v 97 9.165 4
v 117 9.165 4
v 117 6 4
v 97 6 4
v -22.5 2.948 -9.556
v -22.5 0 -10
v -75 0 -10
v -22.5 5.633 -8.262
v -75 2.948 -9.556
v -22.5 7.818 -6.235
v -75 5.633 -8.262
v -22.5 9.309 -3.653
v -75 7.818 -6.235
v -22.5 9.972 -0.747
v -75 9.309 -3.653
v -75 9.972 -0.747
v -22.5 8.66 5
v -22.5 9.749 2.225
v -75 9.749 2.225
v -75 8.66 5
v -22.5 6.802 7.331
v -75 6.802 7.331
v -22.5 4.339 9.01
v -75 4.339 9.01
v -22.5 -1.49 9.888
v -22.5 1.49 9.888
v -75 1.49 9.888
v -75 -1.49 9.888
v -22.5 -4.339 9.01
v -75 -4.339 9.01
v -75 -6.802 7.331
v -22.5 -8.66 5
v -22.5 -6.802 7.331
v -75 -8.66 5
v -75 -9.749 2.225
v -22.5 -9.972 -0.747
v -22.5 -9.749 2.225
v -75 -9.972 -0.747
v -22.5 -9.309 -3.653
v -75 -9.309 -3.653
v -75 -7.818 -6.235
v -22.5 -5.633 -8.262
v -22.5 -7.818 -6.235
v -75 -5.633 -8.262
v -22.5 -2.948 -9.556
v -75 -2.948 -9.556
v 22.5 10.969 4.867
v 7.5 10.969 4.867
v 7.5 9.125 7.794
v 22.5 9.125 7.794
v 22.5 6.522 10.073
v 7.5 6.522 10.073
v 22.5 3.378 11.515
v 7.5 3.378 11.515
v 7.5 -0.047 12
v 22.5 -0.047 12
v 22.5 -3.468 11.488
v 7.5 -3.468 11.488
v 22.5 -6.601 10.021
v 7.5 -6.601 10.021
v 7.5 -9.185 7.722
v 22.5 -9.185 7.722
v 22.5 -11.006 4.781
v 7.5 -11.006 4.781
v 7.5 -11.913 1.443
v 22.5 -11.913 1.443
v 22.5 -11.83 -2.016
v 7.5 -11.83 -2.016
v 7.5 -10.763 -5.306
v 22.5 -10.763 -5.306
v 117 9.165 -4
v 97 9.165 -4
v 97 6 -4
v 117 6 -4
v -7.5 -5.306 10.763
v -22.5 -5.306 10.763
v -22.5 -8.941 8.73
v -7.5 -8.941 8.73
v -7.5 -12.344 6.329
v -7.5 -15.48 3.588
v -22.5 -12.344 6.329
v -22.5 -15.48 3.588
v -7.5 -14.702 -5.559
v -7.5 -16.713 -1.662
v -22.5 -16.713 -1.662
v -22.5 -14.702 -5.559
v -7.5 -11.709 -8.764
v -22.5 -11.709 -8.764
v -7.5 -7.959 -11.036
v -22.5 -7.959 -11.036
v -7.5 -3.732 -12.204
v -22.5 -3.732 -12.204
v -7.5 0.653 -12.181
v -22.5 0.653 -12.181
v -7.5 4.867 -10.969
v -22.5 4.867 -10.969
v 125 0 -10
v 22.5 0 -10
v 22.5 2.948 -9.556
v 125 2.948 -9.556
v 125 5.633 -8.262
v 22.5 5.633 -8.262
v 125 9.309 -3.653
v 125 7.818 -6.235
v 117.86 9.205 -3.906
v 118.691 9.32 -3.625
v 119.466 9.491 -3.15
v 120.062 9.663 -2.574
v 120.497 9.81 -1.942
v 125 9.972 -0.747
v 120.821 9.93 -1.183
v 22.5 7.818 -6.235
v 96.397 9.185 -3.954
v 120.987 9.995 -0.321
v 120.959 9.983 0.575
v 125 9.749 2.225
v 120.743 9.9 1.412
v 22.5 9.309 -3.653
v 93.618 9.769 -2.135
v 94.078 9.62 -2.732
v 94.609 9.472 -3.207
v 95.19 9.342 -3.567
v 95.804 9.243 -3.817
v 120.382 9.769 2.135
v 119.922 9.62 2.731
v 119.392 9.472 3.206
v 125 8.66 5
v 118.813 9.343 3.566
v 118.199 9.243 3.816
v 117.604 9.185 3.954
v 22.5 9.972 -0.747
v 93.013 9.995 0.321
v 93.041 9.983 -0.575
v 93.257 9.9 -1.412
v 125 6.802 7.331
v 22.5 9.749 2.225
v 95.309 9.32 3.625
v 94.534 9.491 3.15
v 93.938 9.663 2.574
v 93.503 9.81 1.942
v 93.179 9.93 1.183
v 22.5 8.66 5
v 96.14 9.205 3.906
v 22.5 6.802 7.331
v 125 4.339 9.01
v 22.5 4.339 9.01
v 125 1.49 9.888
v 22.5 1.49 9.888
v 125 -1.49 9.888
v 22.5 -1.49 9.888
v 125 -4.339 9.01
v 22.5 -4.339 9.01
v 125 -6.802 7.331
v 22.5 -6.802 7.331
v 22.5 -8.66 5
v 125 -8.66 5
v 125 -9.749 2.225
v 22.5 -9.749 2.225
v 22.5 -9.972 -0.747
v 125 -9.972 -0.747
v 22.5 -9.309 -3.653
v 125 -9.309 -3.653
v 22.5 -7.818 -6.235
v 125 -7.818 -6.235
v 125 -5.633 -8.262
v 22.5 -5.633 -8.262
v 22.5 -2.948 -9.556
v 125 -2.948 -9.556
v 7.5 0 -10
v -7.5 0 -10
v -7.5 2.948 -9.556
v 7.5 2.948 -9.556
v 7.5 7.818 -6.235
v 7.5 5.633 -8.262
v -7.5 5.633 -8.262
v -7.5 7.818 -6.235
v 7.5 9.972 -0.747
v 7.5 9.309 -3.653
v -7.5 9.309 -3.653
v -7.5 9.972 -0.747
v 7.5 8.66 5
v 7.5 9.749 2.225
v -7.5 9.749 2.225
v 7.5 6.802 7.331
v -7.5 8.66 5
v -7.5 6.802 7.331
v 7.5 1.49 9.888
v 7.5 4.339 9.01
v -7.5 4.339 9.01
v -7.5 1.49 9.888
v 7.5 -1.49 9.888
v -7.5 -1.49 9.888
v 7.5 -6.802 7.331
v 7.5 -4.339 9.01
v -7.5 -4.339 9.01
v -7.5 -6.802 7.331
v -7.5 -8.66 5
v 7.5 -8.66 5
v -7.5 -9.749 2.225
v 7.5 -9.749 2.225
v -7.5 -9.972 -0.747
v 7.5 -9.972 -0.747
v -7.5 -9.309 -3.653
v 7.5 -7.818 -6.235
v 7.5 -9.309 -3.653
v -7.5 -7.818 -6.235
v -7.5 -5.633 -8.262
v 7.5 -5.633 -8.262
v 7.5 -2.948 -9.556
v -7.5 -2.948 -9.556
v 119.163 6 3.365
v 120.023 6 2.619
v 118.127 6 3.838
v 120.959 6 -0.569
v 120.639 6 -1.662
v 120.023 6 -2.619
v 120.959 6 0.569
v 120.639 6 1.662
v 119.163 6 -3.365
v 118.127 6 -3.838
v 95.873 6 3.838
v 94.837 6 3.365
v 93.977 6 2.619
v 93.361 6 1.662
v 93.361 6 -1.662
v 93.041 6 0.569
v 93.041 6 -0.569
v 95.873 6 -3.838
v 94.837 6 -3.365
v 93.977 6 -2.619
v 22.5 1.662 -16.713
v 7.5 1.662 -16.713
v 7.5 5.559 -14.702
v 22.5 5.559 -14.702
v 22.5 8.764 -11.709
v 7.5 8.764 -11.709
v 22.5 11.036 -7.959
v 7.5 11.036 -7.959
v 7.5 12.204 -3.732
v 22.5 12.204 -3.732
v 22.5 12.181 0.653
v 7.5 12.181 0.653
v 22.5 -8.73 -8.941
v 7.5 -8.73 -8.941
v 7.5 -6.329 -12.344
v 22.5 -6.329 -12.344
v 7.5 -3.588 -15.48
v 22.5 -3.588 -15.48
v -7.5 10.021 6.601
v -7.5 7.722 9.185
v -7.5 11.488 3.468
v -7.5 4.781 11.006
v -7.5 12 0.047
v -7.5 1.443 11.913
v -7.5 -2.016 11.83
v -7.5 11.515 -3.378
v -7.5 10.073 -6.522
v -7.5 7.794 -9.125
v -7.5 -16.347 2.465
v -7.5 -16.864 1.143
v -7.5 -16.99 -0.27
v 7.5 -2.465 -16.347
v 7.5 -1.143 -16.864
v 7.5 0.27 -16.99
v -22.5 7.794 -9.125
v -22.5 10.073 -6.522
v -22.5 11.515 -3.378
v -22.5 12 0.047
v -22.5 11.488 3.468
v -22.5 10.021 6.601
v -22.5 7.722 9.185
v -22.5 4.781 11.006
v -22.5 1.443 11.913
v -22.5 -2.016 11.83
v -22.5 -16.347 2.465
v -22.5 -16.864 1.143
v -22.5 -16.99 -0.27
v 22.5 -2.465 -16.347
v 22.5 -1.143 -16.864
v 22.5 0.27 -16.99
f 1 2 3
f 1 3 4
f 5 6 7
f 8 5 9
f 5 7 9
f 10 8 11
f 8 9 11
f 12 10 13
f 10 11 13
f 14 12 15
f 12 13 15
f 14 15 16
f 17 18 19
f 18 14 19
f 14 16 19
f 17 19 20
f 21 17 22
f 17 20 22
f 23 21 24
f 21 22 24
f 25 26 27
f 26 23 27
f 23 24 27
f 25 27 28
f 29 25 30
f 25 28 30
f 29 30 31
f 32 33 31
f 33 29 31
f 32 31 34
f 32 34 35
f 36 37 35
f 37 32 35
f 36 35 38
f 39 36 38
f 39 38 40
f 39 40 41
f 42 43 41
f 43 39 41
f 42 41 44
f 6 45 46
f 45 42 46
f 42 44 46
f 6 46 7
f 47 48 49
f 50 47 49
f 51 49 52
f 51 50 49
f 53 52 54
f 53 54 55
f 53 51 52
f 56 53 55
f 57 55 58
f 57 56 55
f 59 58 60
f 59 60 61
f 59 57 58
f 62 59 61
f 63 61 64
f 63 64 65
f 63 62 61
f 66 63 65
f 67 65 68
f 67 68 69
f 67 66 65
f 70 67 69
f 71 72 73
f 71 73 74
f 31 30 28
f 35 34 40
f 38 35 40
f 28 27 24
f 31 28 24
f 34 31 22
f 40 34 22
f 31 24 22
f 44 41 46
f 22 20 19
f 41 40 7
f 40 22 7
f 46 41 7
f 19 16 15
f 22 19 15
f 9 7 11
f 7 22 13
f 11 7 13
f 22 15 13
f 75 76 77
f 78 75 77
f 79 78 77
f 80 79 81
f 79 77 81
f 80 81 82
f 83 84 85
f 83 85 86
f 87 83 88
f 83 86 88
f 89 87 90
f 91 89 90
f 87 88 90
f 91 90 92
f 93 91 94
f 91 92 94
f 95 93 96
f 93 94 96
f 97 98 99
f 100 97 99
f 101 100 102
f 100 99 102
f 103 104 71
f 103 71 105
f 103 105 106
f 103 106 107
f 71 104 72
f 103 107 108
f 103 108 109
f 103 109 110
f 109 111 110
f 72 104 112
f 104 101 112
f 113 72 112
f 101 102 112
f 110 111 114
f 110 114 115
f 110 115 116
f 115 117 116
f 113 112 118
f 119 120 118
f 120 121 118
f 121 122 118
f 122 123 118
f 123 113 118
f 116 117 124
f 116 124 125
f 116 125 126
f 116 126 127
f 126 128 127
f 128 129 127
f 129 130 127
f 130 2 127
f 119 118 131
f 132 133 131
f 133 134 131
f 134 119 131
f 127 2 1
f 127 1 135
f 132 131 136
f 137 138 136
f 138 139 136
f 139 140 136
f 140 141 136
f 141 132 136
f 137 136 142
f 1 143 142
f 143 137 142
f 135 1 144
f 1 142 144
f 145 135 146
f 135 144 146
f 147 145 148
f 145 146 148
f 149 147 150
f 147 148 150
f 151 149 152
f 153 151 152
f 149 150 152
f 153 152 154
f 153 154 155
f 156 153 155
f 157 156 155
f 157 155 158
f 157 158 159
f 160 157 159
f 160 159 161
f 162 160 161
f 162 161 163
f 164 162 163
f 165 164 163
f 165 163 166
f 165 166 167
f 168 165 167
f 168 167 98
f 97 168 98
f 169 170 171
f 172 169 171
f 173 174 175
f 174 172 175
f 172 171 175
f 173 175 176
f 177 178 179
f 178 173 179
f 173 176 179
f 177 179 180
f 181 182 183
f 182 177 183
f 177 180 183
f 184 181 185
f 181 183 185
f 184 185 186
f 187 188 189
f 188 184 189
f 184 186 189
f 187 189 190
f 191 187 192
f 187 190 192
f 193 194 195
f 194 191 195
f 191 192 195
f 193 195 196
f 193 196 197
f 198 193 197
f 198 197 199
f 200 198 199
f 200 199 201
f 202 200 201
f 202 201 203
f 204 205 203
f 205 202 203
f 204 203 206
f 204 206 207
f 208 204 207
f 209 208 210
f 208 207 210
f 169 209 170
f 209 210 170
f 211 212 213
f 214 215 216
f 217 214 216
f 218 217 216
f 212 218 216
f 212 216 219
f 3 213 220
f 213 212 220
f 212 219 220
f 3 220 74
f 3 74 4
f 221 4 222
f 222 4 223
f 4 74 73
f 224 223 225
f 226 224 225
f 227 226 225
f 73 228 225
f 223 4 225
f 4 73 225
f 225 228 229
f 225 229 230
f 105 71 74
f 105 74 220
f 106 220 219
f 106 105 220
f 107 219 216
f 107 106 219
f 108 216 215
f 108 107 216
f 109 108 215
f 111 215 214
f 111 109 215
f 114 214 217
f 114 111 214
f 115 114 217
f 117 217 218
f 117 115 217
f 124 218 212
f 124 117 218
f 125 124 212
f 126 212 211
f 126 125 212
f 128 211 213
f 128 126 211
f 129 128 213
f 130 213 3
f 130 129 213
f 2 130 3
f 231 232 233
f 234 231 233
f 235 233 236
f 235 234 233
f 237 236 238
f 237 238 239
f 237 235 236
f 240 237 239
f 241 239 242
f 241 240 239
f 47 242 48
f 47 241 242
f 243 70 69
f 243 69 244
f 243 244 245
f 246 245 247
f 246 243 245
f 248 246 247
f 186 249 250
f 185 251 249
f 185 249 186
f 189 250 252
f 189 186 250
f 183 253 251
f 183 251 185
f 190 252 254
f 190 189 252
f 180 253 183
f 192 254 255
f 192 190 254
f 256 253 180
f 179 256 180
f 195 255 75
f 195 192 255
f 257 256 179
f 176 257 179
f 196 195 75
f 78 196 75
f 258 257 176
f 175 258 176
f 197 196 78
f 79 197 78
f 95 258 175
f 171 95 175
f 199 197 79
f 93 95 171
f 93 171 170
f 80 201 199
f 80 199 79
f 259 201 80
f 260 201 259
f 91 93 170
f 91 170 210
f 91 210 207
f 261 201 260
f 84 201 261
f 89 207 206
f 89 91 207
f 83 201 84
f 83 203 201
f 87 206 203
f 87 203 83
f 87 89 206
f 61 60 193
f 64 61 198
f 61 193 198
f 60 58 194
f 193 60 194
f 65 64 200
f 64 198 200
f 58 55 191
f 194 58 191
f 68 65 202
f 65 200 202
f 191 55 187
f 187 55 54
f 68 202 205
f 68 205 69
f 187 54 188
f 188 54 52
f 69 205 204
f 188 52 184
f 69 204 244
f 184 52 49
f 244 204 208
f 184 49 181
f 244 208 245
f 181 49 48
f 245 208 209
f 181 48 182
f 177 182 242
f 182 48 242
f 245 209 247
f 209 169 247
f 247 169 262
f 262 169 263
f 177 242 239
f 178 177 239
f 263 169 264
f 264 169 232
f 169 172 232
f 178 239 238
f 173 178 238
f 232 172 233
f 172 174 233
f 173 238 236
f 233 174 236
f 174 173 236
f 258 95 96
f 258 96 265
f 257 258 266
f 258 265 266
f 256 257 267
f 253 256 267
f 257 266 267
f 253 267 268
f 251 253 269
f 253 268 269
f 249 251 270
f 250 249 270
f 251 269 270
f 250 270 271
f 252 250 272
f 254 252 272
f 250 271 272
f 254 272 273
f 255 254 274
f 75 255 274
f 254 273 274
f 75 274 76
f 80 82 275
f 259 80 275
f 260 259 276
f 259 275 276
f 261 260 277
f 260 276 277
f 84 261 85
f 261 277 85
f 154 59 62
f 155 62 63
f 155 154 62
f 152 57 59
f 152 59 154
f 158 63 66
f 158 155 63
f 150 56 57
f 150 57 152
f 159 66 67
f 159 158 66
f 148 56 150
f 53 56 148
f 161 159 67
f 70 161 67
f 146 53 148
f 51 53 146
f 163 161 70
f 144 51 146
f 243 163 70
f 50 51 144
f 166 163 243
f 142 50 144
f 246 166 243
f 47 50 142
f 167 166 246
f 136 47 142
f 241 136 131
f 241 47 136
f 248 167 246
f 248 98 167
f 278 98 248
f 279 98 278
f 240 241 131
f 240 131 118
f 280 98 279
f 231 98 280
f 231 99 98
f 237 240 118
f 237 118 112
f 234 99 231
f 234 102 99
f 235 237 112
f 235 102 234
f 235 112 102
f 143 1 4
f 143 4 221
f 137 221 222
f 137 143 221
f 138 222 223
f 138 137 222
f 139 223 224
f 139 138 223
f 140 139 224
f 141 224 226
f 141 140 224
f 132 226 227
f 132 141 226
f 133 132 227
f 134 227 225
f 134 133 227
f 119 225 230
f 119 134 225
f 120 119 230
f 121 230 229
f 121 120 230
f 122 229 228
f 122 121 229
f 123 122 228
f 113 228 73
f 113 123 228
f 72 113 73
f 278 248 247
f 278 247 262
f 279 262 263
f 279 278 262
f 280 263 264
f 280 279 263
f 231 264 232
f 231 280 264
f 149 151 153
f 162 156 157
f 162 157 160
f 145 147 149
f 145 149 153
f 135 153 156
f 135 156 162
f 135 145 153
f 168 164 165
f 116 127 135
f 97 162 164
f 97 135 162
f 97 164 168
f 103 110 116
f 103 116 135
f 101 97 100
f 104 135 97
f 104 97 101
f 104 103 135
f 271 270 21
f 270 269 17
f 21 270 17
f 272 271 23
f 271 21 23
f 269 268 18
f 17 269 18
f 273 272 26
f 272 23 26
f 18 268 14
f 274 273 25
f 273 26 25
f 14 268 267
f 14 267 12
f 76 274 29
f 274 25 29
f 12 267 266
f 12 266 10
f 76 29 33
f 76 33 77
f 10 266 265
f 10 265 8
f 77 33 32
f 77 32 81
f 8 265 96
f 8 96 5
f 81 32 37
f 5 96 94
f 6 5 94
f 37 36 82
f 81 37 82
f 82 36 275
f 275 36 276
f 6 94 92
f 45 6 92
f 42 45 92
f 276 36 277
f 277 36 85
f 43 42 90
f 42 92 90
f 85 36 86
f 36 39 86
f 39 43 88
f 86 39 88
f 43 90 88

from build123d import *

# Parameters (mm, degrees)
BOSS_EXTRUDE1_DEPTH      = 125
BOSS_EXTRUDE1_DEPTH_BACK = 75
SKETCH1_R                = 10
BOSS_EXTRUDE2_START      = 15
BOSS_EXTRUDE2_DEPTH      = 7.5
BODY_MOVE_COPY1_ANGLE    = 90
CUT_EXTRUDE1_DEPTH       = 4


with BuildPart() as part:
    # Sketch1 → Boss-Extrude1 (new, two sides: drawn at the far end of the back side and taken through both)
    with BuildSketch(Plane(origin=(0, 0, 0), x_dir=(0, 0, -1), z_dir=(1, 0, 0)).offset(-BOSS_EXTRUDE1_DEPTH_BACK)):
        Circle(SKETCH1_R)
    extrude(amount=BOSS_EXTRUDE1_DEPTH + BOSS_EXTRUDE1_DEPTH_BACK)

    # Sketch3 → Cut-Extrude1 (cut)
    with BuildSketch(Plane(origin=(0, 10, 0), x_dir=(1, 0, 0), z_dir=(0, 1, 0))):
        with BuildLine():
            Line((97, 4), (117, 4))
            ThreePointArc((117, 4), (121, 0), (117, -4))
            Line((117, -4), (97, -4))
            ThreePointArc((97, -4), (93, 0), (97, 4))
        make_face()
    extrude(amount=-CUT_EXTRUDE1_DEPTH, mode=Mode.SUBTRACT)


with BuildPart() as body_2:
    # Sketch2 → Boss-Extrude2 (new, symmetric)
    with BuildSketch(Plane(origin=(0, 0, 0), x_dir=(0, 0, -1), z_dir=(1, 0, 0)).offset(BOSS_EXTRUDE2_START)):
        with BuildLine():
            ThreePointArc((-4.867089568, 10.968657125), (-10.868088345, -5.087696504), (5.306226617, -10.763083159))
            ThreePointArc((5.306226617, -10.763083159), (10.673744978, -7.573594418), (15.479542802, -3.587694386))
            ThreePointArc((15.479542802, -3.587694386), (16.864464688, -1.143374761), (16.712672037, 1.661917746))
            ThreePointArc((16.712672037, 1.661917746), (7.958571112, 11.035699457), (-4.867089568, 10.968657125))
        make_face()
    extrude(amount=BOSS_EXTRUDE2_DEPTH, both=True)


with BuildPart() as body_3:
    # Mirror1: mirrored copy
    add(body_2.part.mirror(Plane(origin=(0, 0, 0), x_dir=(0, 0, 1), z_dir=(1, 0, 0))))


with BuildPart() as body_3_1:
    # Body-Move/Copy1: moved
    add(body_3.part.rotate(Axis((0, 0, 0), (-1, 0, 0)), BODY_MOVE_COPY1_ANGLE))


with BuildPart() as part_1:
    add(part.part)

    # Combine1: union body 3, body 2
    add(body_3_1.part)
    add(body_2.part)


solid = part_1.part
